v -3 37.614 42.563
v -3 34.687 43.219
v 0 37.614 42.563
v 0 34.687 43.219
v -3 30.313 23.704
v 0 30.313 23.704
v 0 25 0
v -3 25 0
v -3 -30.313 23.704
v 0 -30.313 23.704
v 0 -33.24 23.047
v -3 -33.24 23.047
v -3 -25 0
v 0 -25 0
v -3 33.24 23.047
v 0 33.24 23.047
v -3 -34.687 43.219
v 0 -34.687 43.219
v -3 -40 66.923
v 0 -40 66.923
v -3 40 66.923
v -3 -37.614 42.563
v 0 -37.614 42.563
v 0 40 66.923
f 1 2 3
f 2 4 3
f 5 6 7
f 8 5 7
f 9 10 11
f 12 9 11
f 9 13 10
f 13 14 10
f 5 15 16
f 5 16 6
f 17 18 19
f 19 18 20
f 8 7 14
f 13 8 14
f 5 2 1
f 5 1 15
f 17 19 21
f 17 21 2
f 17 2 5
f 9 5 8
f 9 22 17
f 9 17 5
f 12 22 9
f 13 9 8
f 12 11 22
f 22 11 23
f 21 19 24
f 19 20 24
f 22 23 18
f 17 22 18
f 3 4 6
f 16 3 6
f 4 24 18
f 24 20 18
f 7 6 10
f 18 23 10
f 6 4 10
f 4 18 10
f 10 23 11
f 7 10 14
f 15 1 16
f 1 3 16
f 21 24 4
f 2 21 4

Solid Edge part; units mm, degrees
sketch "Sketch1" plane through (0, 0, 0) normal (1, 0, 0) x (0, 1, 0)
  line L0 (40, 66.9227) -> (34.6871, 43.2192)
  line L1 (34.6871, 43.2192) -> (37.6145, 42.5631)
  line L2 (37.6145, 42.5631) -> (33.2402, 23.0473)
  line L3 (33.2402, 23.0473) -> (30.3129, 23.7035)
  line L4 (30.3129, 23.7035) -> (25, 0)
  line L5 (25, 0) -> (-25, 0)
  line L6 (-25, 0) -> (-30.3129, 23.7035)
  line L7 (-30.3129, 23.7035) -> (-33.2402, 23.0473)
  line L8 (-33.2402, 23.0473) -> (-37.6145, 42.5631)
  line L9 (-37.6145, 42.5631) -> (-34.6871, 43.2192)
  line L10 (-34.6871, 43.2192) -> (-40, 66.9227)
  line L11 (-40, 66.9227) -> (40, 66.9227)
  dimension "D1" = 80
  dimension "D2" = 50
  dimension "D3" = 3
  dimension "D4" = 20
  dimension "D5" = 24.2916
extrude "Protrusion1" add sketch "Sketch1" against normal blind 3
properties material "Acier"
